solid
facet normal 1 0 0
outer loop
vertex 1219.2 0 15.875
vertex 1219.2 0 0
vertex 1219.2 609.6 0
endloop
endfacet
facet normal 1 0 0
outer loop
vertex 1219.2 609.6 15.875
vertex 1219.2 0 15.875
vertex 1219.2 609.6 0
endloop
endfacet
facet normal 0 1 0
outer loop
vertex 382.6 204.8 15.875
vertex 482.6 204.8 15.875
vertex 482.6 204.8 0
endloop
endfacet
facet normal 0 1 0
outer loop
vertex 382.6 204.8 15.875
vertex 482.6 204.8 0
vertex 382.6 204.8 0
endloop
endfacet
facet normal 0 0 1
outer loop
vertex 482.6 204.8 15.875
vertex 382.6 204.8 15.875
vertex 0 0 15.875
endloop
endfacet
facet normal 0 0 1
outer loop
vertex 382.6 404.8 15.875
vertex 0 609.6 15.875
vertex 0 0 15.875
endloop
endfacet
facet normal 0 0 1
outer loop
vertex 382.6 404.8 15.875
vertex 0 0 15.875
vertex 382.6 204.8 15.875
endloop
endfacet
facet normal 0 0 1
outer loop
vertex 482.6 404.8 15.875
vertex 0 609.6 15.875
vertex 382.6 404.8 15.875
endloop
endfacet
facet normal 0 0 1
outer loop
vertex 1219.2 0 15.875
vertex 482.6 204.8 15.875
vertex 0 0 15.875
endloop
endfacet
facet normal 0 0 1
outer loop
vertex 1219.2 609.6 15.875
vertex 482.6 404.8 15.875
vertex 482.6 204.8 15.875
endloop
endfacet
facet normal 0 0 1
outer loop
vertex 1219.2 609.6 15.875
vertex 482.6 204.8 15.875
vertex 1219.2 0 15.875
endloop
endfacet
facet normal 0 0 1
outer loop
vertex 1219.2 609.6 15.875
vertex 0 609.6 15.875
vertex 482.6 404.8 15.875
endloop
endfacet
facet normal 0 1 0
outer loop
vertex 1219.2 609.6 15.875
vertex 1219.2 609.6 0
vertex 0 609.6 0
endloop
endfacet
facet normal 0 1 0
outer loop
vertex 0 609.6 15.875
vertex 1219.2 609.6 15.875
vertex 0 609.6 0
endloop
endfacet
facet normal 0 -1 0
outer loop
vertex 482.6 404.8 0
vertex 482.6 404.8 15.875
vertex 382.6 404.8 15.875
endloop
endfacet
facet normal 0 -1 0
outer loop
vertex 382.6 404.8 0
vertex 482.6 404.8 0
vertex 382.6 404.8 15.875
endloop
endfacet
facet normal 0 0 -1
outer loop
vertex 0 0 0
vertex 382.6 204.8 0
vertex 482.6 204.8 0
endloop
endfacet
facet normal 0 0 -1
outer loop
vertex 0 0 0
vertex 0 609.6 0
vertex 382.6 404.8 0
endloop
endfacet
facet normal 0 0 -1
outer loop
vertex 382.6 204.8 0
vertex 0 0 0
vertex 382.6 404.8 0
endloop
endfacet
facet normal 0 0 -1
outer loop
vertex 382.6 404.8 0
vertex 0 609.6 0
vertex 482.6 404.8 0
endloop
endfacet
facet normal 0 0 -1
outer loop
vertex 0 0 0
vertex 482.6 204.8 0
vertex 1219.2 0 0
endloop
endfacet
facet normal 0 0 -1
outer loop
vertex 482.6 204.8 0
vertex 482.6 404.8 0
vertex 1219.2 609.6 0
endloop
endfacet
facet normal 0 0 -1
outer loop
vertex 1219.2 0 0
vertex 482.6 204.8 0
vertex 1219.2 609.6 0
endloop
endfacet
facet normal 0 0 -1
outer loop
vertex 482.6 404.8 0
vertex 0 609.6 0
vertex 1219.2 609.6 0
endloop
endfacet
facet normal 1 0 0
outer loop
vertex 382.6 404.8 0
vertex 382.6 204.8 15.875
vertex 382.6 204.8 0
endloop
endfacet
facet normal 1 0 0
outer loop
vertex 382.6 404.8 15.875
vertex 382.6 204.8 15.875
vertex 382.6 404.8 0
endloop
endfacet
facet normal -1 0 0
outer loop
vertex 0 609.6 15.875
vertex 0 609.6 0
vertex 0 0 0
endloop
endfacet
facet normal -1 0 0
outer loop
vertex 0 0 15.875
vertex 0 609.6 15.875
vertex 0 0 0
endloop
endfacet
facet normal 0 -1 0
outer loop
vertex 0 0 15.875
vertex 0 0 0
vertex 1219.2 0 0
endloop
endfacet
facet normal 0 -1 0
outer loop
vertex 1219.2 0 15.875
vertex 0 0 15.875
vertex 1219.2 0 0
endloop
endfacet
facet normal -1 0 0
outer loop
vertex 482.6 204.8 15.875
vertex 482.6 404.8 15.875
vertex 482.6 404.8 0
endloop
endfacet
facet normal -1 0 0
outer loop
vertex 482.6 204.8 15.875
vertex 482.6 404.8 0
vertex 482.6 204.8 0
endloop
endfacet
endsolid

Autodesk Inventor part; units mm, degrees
ref_plane "YZ Plane" through (0, 0, 0) normal (1, 0, 0) x (0, 1, 0)
ref_plane "XZ Plane" through (0, 0, 0) normal (0, 1, 0) x (-1, 0, 0)
ref_plane "XY Plane" through (0, 0, 0) normal (0, 0, 1) x (1, 0, 0)
sketch "Sketch1" plane through (0, 0, 0) normal (0, 0, 1) x (1, 0, 0)
  line L0 (0, 0) -> (1219.2, 0)
  line L1 (1219.2, 0) -> (1219.2, 609.6)
  line L2 (1219.2, 609.6) -> (0, 609.6)
  line L3 (0, 609.6) -> (0, 0)
  dimension "d0" = 1219.2
  dimension "d1" = 609.6
extrude "Extrusion1" add sketch "Sketch1" along normal blind 15.875
sketch "Sketch6" plane through (0, 0, 15.875) normal (0, 0, 1) x (1, 0, 0)
  line L0 (482.6, 404.8) -> (382.6, 404.8)
  line L1 (482.6, 204.8) -> (382.6, 204.8)
  line L2 (382.6, 204.8) -> (382.6, 404.8)
  line L3 (482.6, 404.8) -> (482.6, 204.8)
extrude "Extrusion5" cut sketch "Sketch6" against normal blind 90
properties part number "Window Gyp Board"
